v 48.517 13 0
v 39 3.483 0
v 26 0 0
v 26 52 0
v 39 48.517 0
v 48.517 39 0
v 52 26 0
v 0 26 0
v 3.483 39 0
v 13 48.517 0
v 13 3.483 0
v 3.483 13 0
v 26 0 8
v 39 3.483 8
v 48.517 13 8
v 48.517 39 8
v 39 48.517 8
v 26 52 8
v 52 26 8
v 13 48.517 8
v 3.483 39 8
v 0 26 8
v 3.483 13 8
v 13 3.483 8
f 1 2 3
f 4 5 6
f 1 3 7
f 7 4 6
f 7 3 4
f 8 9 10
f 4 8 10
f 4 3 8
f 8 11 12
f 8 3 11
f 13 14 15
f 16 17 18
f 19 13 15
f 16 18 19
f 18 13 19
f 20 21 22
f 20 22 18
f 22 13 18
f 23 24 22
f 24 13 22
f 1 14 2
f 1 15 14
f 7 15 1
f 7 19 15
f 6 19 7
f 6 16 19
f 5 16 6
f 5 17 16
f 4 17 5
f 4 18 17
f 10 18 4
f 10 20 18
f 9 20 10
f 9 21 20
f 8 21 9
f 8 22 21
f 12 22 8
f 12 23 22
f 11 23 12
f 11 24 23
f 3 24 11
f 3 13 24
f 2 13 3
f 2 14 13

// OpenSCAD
$fn = 32;

// ----------------------------------------------------------------------
// Eccentric disc: step, 8 mm thick
// ----------------------------------------------------------------------

// --- parameters (mm) ---
profile_height = 8;       // extrusion height
profile_points = 12;      // points of the closed outline

profile = [[0, 26], [3.483, 13], [13, 3.483], [26, 0], [39, 3.483], [48.517, 13], [52, 26], [48.517, 39], [39, 48.517], [26, 52], [13, 48.517], [3.483, 39]];  // single closed polygon, 12 points, counter clockwise

// --- the one profile operation ---
linear_extrude(height = profile_height) polygon(points = profile);
